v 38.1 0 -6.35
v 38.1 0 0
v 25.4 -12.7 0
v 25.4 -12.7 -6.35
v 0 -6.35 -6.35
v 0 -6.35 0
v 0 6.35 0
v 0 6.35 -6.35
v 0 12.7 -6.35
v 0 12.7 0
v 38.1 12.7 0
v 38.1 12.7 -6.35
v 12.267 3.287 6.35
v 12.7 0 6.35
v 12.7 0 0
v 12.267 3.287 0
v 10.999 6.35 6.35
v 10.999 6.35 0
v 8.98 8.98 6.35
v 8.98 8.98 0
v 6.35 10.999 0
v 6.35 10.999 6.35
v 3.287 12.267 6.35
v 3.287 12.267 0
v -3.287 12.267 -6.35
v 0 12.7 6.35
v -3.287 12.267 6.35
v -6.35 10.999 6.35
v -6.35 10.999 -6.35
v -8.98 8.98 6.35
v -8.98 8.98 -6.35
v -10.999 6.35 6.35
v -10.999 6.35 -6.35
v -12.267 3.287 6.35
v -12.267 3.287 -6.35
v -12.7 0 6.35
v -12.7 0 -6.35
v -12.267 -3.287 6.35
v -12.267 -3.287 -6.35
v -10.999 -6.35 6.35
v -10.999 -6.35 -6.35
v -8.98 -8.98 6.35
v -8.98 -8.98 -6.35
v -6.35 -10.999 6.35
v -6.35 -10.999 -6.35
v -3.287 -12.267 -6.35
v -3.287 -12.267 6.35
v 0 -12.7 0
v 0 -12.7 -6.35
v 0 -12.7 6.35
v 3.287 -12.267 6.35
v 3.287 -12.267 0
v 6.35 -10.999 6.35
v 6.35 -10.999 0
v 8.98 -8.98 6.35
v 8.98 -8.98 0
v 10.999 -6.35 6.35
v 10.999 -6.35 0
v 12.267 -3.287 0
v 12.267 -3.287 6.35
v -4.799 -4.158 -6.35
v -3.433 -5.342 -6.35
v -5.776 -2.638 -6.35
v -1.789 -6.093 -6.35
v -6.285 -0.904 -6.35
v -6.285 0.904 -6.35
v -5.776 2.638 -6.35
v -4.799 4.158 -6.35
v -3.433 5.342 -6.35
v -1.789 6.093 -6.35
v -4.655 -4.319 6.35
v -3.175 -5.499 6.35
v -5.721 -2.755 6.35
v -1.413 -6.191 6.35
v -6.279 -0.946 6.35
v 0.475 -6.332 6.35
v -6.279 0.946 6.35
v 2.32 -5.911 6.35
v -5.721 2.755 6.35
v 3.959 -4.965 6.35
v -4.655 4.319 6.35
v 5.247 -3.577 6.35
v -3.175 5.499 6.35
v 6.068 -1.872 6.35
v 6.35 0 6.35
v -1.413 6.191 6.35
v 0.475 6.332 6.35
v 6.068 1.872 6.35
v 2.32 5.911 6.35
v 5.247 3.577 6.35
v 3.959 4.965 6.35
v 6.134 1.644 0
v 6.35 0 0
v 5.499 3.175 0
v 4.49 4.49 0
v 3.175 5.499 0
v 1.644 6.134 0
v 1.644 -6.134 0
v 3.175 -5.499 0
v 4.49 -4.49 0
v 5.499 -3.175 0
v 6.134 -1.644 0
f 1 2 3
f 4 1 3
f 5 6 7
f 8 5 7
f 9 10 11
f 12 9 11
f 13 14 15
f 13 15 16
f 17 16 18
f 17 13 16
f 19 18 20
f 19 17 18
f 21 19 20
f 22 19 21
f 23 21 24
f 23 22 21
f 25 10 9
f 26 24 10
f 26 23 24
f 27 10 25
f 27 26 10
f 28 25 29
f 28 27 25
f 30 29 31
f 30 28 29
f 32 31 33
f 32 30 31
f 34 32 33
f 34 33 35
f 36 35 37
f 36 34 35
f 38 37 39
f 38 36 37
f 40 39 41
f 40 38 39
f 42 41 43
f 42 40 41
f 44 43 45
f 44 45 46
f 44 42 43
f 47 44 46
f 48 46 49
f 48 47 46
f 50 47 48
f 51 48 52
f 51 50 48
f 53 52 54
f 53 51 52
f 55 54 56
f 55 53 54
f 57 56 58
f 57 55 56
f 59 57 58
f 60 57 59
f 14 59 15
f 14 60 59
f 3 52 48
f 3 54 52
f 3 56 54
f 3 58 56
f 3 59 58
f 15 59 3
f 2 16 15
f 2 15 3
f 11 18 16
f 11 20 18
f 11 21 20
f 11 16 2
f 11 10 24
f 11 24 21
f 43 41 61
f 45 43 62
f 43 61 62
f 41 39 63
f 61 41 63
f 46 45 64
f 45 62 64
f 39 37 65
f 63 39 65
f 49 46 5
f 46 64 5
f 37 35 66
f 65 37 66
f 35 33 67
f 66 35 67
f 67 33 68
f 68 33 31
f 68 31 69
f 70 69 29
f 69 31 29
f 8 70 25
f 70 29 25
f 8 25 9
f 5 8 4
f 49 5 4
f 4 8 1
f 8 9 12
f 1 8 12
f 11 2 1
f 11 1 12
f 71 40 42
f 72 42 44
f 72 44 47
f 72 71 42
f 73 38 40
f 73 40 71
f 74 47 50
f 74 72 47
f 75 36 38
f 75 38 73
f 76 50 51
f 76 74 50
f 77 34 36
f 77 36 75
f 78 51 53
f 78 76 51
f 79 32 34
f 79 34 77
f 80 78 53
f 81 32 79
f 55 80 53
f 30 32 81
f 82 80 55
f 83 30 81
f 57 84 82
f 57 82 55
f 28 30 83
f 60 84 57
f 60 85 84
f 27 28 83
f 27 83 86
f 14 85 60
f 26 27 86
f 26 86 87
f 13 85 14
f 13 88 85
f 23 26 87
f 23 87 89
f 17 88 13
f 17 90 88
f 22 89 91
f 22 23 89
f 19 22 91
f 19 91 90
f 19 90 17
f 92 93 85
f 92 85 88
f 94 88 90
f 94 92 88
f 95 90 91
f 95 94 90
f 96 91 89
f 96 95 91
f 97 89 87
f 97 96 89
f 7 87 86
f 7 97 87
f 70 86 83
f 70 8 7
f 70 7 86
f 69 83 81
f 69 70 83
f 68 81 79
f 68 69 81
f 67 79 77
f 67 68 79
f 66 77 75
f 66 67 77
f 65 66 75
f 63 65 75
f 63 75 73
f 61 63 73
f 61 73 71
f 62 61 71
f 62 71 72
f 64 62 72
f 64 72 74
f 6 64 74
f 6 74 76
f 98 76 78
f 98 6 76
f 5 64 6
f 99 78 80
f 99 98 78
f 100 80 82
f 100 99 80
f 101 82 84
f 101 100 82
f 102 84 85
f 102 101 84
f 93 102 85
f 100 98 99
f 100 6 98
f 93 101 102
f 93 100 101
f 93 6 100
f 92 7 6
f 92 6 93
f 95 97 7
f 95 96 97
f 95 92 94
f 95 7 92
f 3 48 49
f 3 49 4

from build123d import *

# Parameters (mm, degrees)
F0_R     = 12.7
F0_R_2   = 6.35
F1_DEPTH = 6.35
F2_W     = 38.1
F2_H     = 25.4
F3_DEPTH = 6.35
F5_DEPTH = 6.351


with BuildPart() as f1:
    # F0 (on Top) → F1 (new body, symmetric)
    with BuildSketch(Plane.XY):
        Circle(F0_R)
        Circle(F0_R_2, mode=Mode.SUBTRACT)
    extrude(amount=F1_DEPTH, both=True)

    # F2 (on Top) → F3 (join)
    with BuildSketch(Plane.XY):
        with Locations((19.05, 0)):
            Rectangle(F2_W, F2_H)
    extrude(amount=-F3_DEPTH)

    # F4 (on face) → F5 (cut, through all)
    with BuildSketch(Plane.XY):
        Polygon((38.1, -12.7), (38.1, 0), (25.4, -12.7), align=None)
    extrude(amount=-F5_DEPTH, mode=Mode.SUBTRACT)


solid = f1.part
